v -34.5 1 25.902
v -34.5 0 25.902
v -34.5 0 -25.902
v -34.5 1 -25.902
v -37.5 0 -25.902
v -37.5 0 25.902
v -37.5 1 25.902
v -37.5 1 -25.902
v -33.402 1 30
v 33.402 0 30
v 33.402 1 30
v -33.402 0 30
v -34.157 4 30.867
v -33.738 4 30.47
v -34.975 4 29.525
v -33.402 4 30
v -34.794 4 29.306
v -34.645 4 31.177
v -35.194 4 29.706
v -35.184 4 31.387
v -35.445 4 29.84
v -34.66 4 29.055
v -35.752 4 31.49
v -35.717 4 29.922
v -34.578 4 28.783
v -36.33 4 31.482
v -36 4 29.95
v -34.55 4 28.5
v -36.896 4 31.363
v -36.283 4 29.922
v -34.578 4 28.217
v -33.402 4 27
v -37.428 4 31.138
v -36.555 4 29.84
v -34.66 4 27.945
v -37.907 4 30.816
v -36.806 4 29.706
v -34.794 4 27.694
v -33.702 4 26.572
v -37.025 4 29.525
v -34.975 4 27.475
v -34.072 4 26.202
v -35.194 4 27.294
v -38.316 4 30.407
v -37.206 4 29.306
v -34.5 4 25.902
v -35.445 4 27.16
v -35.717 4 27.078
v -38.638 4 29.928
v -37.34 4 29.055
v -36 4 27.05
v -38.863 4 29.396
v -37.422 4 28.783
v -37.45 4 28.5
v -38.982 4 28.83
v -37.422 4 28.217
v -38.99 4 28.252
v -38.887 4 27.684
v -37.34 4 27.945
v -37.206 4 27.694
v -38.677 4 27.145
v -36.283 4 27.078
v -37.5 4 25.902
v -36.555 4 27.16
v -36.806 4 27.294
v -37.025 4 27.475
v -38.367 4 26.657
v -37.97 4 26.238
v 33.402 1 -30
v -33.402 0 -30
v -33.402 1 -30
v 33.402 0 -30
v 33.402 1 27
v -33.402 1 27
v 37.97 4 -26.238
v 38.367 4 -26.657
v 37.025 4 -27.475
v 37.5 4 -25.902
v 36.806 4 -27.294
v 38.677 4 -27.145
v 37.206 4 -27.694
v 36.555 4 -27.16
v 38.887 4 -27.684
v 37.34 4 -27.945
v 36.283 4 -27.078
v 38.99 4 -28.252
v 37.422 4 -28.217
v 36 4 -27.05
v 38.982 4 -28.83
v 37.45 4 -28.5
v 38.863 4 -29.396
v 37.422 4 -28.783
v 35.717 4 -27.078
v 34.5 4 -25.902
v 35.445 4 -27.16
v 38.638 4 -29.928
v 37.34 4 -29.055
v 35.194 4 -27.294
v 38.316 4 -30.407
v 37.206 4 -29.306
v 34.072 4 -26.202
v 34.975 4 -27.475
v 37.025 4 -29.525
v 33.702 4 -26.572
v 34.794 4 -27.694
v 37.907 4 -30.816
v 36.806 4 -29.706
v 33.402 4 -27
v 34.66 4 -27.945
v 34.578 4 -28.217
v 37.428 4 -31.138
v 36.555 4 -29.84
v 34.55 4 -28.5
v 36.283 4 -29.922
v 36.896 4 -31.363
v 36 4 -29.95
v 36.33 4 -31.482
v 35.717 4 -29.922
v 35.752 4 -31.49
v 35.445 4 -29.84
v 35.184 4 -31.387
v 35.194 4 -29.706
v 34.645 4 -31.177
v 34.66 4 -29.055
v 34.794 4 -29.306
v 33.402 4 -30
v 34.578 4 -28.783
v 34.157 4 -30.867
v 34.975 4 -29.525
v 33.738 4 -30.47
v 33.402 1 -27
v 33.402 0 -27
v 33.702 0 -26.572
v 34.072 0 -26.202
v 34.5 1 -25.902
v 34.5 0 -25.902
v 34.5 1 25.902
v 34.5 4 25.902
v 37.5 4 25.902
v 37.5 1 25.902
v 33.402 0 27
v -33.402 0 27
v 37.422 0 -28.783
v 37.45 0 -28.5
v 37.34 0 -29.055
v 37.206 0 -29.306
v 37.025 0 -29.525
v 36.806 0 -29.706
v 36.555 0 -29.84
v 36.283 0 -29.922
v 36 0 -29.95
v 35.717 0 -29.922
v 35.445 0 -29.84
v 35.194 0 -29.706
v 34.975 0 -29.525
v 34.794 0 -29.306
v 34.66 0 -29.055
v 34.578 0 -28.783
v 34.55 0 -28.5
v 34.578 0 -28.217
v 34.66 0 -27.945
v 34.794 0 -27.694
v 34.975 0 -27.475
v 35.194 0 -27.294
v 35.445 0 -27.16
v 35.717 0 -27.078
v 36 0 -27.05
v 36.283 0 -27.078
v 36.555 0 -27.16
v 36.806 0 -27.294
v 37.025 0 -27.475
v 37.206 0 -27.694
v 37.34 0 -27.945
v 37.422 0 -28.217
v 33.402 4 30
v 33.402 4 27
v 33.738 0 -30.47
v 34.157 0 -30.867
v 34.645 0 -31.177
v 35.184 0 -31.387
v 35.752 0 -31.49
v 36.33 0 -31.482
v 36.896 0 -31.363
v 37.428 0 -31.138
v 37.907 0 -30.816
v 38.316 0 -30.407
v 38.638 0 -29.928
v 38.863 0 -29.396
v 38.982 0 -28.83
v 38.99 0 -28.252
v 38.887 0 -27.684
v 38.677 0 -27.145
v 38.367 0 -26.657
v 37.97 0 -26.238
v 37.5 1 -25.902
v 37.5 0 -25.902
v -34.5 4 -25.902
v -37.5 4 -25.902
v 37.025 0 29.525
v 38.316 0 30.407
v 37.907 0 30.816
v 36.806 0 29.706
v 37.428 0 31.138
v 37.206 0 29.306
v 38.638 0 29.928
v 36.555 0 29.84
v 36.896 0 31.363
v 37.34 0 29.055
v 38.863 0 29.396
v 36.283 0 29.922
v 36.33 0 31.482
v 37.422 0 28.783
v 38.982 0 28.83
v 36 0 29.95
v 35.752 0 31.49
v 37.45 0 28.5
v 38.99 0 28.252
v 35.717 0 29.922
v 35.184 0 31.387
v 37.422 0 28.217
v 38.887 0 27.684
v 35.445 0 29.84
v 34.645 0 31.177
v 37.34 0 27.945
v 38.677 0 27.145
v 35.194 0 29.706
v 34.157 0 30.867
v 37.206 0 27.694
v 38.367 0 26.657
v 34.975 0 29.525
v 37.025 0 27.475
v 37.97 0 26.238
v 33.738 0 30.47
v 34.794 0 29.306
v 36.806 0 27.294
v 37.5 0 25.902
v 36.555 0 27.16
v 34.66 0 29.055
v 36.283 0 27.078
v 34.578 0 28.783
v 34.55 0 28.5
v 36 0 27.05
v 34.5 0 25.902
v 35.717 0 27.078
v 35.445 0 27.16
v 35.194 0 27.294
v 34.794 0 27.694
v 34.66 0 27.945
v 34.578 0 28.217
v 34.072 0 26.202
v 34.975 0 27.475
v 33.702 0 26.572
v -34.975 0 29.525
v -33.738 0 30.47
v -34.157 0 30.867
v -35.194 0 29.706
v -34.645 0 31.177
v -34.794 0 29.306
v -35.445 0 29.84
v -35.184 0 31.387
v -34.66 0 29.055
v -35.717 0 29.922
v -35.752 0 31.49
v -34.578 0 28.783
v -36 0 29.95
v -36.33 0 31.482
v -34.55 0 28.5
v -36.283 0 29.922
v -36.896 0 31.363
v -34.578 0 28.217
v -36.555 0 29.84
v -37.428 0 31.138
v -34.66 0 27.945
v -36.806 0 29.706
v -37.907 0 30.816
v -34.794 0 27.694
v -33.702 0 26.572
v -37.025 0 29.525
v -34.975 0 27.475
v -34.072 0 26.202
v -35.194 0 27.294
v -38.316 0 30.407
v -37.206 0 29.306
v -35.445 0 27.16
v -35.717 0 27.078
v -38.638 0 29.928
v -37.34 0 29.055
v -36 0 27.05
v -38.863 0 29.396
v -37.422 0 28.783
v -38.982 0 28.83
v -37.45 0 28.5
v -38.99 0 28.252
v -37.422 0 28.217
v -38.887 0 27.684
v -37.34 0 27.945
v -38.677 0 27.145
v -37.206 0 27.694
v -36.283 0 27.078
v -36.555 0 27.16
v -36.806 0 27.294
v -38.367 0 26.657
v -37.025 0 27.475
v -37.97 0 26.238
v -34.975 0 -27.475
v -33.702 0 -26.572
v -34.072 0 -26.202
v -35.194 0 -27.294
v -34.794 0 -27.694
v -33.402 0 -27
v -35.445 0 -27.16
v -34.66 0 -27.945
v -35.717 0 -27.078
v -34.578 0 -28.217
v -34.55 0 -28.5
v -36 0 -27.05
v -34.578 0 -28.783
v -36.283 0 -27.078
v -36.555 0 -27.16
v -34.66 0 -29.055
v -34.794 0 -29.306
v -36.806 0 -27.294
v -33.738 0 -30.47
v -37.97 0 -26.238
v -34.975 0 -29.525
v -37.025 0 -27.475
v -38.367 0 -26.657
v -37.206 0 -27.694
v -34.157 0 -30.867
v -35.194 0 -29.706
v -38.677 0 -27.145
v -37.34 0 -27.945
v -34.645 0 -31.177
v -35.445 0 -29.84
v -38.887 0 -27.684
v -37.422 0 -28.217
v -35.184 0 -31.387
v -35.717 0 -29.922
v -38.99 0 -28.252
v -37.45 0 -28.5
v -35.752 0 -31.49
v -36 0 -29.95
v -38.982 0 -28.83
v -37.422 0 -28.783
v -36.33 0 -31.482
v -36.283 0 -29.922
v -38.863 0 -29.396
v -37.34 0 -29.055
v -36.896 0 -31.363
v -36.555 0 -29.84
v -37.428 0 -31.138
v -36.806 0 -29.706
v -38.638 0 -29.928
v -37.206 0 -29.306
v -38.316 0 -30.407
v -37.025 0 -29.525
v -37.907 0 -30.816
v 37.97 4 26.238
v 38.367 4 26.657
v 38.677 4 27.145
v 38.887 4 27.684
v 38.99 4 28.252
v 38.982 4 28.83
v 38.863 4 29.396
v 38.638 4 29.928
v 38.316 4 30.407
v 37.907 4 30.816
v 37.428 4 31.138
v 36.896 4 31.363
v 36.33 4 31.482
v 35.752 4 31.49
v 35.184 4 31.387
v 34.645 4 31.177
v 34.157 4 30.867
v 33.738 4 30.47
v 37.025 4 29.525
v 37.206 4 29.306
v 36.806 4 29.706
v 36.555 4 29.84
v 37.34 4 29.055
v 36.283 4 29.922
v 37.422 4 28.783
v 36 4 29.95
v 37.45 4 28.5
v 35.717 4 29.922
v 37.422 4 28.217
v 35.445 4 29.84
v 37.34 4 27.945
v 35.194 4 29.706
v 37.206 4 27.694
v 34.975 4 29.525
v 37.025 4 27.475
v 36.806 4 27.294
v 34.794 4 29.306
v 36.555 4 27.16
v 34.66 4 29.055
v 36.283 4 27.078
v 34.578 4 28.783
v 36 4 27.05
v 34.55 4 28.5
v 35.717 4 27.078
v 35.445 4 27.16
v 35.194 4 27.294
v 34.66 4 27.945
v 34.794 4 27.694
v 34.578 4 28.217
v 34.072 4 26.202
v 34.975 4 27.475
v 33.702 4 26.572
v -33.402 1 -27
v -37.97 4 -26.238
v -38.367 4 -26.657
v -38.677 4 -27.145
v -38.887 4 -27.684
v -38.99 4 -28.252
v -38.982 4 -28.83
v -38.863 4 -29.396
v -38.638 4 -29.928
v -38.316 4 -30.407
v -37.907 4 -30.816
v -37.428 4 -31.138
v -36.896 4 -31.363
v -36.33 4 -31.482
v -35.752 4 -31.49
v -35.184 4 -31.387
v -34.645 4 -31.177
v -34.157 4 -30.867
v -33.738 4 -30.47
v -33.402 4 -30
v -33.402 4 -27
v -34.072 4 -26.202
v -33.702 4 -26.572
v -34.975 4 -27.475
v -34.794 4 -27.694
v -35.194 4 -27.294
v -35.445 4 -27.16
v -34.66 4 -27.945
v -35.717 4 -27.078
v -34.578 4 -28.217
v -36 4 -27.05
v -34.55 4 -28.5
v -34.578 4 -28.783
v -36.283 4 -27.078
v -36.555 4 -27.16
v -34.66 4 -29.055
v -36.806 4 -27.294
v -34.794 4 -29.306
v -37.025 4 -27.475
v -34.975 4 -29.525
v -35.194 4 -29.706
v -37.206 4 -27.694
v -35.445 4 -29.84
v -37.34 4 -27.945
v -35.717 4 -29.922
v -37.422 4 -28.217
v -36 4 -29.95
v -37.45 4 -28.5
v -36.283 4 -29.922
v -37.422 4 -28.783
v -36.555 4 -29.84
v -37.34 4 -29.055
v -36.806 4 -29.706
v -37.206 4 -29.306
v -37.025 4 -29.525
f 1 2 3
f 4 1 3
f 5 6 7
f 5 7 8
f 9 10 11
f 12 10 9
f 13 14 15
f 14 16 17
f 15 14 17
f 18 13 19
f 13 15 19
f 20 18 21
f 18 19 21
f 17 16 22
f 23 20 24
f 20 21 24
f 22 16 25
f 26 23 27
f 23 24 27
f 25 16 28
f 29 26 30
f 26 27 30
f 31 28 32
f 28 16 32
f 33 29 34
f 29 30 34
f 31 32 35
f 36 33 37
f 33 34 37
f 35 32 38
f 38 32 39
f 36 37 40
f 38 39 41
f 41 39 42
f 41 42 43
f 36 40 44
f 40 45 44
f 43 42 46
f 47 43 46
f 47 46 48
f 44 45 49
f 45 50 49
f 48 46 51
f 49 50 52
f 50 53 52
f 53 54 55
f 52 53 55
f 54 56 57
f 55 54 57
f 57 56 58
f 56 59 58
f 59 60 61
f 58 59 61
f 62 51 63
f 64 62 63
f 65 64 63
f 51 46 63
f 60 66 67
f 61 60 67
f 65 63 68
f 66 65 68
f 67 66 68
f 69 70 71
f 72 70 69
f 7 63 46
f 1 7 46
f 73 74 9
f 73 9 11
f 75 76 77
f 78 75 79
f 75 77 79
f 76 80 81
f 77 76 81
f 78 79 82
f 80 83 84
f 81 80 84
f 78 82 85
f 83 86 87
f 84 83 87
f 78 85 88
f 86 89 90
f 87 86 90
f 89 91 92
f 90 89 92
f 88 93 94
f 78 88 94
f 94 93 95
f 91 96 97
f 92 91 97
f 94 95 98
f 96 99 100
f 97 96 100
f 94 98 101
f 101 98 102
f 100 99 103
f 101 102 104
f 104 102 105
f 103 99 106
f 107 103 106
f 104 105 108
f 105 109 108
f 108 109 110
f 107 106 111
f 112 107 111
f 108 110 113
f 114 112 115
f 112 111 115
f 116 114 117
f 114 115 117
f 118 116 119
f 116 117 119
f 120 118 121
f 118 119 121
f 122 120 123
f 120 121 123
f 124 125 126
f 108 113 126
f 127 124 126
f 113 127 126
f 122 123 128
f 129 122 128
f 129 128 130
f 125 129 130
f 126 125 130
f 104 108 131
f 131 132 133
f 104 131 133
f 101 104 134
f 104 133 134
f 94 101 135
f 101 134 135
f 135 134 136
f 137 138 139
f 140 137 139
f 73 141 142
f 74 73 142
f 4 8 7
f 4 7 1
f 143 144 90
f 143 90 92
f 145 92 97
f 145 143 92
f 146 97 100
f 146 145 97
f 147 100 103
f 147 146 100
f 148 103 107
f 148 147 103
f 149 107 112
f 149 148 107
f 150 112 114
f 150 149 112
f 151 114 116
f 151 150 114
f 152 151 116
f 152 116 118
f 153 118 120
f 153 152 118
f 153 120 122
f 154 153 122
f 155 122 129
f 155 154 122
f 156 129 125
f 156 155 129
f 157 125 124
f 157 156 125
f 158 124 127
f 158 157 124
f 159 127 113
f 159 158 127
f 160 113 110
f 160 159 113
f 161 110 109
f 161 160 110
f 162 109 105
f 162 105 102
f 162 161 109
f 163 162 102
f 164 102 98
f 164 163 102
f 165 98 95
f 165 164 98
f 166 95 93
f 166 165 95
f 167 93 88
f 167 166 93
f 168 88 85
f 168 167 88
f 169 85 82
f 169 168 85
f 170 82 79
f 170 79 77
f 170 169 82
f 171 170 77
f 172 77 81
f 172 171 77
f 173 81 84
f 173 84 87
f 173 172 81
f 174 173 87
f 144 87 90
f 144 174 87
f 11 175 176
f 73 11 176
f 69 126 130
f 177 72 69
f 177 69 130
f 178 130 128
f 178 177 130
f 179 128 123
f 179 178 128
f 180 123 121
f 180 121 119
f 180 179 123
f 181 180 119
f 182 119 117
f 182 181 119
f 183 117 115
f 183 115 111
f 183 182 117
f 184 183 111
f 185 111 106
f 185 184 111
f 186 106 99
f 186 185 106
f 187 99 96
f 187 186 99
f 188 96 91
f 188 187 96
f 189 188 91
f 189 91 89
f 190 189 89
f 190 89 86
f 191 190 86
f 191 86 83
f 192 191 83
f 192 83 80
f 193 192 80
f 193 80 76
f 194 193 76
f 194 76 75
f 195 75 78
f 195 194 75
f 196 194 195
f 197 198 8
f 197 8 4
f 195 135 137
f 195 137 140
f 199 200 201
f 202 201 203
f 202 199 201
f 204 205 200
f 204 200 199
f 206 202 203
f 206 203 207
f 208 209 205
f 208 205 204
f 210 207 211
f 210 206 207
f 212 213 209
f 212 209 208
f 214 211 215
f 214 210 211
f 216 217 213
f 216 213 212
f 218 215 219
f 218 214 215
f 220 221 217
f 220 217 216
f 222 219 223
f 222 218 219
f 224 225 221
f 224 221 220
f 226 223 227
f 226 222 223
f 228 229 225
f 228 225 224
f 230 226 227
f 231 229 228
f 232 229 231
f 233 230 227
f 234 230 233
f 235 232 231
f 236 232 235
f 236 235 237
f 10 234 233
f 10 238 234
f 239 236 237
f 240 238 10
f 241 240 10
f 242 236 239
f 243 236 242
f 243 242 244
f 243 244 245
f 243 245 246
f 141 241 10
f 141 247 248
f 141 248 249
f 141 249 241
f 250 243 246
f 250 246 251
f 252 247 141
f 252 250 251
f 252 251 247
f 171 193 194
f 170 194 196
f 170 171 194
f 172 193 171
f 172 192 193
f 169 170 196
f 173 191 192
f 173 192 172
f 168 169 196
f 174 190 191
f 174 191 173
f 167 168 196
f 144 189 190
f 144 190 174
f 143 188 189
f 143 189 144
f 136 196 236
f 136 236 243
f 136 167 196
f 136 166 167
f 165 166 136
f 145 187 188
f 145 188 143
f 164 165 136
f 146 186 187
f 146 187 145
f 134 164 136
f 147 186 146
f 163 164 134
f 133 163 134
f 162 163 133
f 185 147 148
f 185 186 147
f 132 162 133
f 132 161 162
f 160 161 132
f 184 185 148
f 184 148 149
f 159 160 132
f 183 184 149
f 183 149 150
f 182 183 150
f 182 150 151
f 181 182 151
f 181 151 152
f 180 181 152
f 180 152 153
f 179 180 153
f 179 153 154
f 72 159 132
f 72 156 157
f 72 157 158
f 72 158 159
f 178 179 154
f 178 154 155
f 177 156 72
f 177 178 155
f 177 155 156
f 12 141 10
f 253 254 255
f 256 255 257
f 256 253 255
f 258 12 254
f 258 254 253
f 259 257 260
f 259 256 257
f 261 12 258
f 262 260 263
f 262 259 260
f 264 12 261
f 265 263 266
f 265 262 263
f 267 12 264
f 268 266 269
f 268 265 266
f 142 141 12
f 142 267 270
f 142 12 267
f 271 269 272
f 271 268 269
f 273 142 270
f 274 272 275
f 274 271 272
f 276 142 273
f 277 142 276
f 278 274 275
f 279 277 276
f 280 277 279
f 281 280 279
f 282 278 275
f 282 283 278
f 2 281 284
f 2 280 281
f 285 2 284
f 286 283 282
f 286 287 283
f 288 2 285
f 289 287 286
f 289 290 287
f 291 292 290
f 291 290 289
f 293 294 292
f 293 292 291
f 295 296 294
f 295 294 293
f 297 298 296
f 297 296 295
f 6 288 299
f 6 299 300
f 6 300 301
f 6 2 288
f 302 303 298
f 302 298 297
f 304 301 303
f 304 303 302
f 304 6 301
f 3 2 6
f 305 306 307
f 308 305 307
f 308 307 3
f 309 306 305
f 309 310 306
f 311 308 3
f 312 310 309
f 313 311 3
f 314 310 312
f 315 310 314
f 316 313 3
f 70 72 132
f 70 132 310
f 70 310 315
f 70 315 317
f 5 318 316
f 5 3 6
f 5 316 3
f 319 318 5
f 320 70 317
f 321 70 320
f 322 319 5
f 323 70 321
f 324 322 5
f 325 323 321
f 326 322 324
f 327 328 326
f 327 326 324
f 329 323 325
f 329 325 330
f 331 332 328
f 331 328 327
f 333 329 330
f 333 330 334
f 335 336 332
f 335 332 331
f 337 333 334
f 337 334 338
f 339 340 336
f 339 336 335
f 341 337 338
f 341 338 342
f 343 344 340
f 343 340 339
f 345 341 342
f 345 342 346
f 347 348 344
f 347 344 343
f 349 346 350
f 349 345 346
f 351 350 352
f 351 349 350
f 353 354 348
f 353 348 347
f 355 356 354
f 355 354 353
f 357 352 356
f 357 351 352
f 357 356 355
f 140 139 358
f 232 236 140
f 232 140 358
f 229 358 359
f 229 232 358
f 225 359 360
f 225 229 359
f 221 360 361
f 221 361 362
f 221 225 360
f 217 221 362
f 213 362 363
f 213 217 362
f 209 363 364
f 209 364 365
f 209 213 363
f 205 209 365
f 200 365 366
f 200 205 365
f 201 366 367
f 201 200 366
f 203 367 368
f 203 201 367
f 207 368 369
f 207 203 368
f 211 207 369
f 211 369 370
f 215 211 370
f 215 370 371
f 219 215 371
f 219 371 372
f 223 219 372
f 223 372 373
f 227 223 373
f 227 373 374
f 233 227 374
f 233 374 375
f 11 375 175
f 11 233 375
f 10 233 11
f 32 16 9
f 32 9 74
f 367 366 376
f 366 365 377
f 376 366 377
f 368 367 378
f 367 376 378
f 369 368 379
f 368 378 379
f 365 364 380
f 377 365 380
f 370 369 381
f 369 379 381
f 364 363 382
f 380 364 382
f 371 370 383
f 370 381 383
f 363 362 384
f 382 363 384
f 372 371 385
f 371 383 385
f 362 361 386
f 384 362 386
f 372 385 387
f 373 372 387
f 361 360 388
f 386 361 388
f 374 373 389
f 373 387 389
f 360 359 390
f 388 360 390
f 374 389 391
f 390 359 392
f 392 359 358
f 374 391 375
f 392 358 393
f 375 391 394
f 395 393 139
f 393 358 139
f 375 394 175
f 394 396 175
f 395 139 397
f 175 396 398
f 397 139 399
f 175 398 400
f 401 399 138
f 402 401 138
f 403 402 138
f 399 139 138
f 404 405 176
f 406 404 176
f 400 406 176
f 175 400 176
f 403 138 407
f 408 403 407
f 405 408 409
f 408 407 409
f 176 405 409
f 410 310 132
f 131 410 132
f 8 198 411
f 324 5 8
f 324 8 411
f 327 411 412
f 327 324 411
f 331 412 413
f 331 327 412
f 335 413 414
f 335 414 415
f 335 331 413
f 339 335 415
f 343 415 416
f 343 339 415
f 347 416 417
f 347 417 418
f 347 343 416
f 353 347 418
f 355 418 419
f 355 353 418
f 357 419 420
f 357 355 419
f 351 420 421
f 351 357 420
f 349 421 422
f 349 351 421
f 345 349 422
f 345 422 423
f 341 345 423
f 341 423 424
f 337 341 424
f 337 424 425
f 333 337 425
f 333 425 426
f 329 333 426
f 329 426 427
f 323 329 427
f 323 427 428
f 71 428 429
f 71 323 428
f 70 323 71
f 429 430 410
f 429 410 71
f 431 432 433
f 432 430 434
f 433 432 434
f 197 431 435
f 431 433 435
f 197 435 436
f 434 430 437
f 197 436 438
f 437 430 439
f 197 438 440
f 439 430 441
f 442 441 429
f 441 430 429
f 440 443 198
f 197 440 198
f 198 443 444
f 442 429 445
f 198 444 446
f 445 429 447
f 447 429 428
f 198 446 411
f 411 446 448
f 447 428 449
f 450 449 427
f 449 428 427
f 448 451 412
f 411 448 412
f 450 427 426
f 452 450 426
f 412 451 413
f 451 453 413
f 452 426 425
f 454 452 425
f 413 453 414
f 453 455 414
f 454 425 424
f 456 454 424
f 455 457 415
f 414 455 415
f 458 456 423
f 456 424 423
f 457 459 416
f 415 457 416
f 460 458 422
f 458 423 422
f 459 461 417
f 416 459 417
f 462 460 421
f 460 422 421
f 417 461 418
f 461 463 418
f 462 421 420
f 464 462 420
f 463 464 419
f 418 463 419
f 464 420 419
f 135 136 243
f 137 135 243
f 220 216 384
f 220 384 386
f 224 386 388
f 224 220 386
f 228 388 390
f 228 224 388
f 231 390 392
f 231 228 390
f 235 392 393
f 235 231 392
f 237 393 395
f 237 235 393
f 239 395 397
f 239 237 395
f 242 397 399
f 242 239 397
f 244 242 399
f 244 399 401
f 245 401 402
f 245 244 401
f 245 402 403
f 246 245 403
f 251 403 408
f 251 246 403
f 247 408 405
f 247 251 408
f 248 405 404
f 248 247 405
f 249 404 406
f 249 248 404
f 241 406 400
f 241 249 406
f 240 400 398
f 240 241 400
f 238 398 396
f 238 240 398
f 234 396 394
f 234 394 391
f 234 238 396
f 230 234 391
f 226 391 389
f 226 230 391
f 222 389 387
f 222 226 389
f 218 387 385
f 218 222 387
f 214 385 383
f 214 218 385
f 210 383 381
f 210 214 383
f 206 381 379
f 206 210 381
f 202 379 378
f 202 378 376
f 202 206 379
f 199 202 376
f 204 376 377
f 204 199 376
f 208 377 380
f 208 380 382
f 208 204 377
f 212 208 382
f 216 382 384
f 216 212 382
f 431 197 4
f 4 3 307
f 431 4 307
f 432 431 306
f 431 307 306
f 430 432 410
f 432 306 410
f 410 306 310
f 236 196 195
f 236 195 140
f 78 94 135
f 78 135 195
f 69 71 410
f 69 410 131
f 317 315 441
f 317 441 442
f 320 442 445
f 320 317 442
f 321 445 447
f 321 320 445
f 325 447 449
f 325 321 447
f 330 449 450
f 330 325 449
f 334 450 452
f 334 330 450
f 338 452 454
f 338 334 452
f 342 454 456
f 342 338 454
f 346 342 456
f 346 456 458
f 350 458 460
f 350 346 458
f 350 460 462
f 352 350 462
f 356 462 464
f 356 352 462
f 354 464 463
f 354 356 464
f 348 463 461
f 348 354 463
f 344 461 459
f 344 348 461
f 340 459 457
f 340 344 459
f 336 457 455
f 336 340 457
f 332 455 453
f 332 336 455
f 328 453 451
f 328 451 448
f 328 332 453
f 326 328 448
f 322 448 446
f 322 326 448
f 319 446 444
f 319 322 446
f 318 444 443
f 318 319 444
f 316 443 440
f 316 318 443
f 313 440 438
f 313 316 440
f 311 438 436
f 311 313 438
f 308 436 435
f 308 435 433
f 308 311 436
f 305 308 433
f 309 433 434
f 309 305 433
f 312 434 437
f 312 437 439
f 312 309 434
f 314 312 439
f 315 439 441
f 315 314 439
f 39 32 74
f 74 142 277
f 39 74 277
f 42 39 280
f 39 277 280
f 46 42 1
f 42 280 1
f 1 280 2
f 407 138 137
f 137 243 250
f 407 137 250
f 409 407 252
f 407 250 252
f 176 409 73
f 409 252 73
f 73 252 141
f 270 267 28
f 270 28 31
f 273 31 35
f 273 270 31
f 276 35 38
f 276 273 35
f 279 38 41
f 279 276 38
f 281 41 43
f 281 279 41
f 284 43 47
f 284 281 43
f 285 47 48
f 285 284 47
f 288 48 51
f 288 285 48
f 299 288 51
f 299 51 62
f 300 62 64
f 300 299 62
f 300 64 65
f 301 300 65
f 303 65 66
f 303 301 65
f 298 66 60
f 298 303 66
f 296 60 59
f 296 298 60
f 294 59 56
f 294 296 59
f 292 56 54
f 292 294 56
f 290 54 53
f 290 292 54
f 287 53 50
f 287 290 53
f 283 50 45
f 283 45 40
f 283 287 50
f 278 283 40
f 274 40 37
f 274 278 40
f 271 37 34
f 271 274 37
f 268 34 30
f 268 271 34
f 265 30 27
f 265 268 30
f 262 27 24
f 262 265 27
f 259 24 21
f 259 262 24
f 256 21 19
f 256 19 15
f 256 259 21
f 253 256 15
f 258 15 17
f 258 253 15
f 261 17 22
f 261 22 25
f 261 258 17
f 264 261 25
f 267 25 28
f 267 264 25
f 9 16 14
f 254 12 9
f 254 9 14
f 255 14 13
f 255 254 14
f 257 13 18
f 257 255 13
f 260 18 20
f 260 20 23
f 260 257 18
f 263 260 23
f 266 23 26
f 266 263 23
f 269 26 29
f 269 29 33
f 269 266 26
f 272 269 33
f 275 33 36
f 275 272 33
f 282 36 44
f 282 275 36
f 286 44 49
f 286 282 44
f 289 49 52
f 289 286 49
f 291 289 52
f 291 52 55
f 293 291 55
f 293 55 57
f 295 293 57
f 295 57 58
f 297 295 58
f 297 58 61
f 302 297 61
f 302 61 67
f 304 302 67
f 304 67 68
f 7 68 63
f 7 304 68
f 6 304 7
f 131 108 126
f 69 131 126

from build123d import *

# Parameters (mm, degrees)
SKETCH1_R           = 1.45
BOSS_EXTRUDE1_DEPTH = 4
SKETCH2_W           = 3
SKETCH2_H           = 51.803847578
SKETCH2_W_2         = 66.803847578
SKETCH2_H_2         = 3
CUT_EXTRUDE1_DEPTH  = 3


with BuildPart() as part:
    # Sketch1 → Boss-Extrude1 (new body)
    with BuildSketch(Plane(origin=(0, 0, 0), x_dir=(1, 0, 0), z_dir=(0, 1, 0))):
        with BuildLine():
            Line((-33.401923789, 30), (33.401923789, 30))
            ThreePointArc((33.401923789, 30), (38.121320344, 30.621320344), (37.5, 25.901923789))
            Line((37.5, 25.901923789), (37.5, -25.901923789))
            ThreePointArc((37.5, -25.901923789), (38.121320344, -30.621320344), (33.401923789, -30))
            Line((33.401923789, -30), (-33.401923789, -30))
            ThreePointArc((-33.401923789, -30), (-38.121320344, -30.621320344), (-37.5, -25.901923789))
            Line((-37.5, -25.901923789), (-37.5, 25.901923789))
            ThreePointArc((-37.5, 25.901923789), (-38.121320344, 30.621320344), (-33.401923789, 30))
        make_face()
        with Locations((36, 28.5)):
            Circle(SKETCH1_R, mode=Mode.SUBTRACT)
        with Locations((36, -28.5)):
            Circle(SKETCH1_R, mode=Mode.SUBTRACT)
        with Locations((-36, -28.5)):
            Circle(SKETCH1_R, mode=Mode.SUBTRACT)
        with Locations((-36, 28.5)):
            Circle(SKETCH1_R, mode=Mode.SUBTRACT)
        with BuildLine():
            Line((-33.401923789, 27), (33.401923789, 27))
            ThreePointArc((33.401923789, 27), (33.878679656, 26.378679656), (34.5, 25.901923789))
            Line((34.5, 25.901923789), (34.5, -25.901923789))
            ThreePointArc((34.5, -25.901923789), (33.878679656, -26.378679656), (33.401923789, -27))
            Line((33.401923789, -27), (-33.401923789, -27))
            ThreePointArc((-33.401923789, -27), (-33.878679656, -26.378679656), (-34.5, -25.901923789))
            Line((-34.5, -25.901923789), (-34.5, 25.901923789))
            ThreePointArc((-34.5, 25.901923789), (-33.878679656, 26.378679656), (-33.401923789, 27))
        make_face(mode=Mode.SUBTRACT)
    extrude(amount=BOSS_EXTRUDE1_DEPTH)

    # Sketch2 → Cut-Extrude1 (cut)
    with BuildSketch(Plane(origin=(0, 4, 0), x_dir=(1, 0, 0), z_dir=(0, 1, 0))):
        with Locations((-36, 0)):
            Rectangle(SKETCH2_W, SKETCH2_H)
        with Locations((0, -28.5)):
            Rectangle(SKETCH2_W_2, SKETCH2_H_2)
        with Locations((36, 0)):
            Rectangle(SKETCH2_W, SKETCH2_H)
        with Locations((0, 28.5)):
            Rectangle(SKETCH2_W_2, SKETCH2_H_2)
    extrude(amount=-CUT_EXTRUDE1_DEPTH, mode=Mode.SUBTRACT)


solid = part.part
